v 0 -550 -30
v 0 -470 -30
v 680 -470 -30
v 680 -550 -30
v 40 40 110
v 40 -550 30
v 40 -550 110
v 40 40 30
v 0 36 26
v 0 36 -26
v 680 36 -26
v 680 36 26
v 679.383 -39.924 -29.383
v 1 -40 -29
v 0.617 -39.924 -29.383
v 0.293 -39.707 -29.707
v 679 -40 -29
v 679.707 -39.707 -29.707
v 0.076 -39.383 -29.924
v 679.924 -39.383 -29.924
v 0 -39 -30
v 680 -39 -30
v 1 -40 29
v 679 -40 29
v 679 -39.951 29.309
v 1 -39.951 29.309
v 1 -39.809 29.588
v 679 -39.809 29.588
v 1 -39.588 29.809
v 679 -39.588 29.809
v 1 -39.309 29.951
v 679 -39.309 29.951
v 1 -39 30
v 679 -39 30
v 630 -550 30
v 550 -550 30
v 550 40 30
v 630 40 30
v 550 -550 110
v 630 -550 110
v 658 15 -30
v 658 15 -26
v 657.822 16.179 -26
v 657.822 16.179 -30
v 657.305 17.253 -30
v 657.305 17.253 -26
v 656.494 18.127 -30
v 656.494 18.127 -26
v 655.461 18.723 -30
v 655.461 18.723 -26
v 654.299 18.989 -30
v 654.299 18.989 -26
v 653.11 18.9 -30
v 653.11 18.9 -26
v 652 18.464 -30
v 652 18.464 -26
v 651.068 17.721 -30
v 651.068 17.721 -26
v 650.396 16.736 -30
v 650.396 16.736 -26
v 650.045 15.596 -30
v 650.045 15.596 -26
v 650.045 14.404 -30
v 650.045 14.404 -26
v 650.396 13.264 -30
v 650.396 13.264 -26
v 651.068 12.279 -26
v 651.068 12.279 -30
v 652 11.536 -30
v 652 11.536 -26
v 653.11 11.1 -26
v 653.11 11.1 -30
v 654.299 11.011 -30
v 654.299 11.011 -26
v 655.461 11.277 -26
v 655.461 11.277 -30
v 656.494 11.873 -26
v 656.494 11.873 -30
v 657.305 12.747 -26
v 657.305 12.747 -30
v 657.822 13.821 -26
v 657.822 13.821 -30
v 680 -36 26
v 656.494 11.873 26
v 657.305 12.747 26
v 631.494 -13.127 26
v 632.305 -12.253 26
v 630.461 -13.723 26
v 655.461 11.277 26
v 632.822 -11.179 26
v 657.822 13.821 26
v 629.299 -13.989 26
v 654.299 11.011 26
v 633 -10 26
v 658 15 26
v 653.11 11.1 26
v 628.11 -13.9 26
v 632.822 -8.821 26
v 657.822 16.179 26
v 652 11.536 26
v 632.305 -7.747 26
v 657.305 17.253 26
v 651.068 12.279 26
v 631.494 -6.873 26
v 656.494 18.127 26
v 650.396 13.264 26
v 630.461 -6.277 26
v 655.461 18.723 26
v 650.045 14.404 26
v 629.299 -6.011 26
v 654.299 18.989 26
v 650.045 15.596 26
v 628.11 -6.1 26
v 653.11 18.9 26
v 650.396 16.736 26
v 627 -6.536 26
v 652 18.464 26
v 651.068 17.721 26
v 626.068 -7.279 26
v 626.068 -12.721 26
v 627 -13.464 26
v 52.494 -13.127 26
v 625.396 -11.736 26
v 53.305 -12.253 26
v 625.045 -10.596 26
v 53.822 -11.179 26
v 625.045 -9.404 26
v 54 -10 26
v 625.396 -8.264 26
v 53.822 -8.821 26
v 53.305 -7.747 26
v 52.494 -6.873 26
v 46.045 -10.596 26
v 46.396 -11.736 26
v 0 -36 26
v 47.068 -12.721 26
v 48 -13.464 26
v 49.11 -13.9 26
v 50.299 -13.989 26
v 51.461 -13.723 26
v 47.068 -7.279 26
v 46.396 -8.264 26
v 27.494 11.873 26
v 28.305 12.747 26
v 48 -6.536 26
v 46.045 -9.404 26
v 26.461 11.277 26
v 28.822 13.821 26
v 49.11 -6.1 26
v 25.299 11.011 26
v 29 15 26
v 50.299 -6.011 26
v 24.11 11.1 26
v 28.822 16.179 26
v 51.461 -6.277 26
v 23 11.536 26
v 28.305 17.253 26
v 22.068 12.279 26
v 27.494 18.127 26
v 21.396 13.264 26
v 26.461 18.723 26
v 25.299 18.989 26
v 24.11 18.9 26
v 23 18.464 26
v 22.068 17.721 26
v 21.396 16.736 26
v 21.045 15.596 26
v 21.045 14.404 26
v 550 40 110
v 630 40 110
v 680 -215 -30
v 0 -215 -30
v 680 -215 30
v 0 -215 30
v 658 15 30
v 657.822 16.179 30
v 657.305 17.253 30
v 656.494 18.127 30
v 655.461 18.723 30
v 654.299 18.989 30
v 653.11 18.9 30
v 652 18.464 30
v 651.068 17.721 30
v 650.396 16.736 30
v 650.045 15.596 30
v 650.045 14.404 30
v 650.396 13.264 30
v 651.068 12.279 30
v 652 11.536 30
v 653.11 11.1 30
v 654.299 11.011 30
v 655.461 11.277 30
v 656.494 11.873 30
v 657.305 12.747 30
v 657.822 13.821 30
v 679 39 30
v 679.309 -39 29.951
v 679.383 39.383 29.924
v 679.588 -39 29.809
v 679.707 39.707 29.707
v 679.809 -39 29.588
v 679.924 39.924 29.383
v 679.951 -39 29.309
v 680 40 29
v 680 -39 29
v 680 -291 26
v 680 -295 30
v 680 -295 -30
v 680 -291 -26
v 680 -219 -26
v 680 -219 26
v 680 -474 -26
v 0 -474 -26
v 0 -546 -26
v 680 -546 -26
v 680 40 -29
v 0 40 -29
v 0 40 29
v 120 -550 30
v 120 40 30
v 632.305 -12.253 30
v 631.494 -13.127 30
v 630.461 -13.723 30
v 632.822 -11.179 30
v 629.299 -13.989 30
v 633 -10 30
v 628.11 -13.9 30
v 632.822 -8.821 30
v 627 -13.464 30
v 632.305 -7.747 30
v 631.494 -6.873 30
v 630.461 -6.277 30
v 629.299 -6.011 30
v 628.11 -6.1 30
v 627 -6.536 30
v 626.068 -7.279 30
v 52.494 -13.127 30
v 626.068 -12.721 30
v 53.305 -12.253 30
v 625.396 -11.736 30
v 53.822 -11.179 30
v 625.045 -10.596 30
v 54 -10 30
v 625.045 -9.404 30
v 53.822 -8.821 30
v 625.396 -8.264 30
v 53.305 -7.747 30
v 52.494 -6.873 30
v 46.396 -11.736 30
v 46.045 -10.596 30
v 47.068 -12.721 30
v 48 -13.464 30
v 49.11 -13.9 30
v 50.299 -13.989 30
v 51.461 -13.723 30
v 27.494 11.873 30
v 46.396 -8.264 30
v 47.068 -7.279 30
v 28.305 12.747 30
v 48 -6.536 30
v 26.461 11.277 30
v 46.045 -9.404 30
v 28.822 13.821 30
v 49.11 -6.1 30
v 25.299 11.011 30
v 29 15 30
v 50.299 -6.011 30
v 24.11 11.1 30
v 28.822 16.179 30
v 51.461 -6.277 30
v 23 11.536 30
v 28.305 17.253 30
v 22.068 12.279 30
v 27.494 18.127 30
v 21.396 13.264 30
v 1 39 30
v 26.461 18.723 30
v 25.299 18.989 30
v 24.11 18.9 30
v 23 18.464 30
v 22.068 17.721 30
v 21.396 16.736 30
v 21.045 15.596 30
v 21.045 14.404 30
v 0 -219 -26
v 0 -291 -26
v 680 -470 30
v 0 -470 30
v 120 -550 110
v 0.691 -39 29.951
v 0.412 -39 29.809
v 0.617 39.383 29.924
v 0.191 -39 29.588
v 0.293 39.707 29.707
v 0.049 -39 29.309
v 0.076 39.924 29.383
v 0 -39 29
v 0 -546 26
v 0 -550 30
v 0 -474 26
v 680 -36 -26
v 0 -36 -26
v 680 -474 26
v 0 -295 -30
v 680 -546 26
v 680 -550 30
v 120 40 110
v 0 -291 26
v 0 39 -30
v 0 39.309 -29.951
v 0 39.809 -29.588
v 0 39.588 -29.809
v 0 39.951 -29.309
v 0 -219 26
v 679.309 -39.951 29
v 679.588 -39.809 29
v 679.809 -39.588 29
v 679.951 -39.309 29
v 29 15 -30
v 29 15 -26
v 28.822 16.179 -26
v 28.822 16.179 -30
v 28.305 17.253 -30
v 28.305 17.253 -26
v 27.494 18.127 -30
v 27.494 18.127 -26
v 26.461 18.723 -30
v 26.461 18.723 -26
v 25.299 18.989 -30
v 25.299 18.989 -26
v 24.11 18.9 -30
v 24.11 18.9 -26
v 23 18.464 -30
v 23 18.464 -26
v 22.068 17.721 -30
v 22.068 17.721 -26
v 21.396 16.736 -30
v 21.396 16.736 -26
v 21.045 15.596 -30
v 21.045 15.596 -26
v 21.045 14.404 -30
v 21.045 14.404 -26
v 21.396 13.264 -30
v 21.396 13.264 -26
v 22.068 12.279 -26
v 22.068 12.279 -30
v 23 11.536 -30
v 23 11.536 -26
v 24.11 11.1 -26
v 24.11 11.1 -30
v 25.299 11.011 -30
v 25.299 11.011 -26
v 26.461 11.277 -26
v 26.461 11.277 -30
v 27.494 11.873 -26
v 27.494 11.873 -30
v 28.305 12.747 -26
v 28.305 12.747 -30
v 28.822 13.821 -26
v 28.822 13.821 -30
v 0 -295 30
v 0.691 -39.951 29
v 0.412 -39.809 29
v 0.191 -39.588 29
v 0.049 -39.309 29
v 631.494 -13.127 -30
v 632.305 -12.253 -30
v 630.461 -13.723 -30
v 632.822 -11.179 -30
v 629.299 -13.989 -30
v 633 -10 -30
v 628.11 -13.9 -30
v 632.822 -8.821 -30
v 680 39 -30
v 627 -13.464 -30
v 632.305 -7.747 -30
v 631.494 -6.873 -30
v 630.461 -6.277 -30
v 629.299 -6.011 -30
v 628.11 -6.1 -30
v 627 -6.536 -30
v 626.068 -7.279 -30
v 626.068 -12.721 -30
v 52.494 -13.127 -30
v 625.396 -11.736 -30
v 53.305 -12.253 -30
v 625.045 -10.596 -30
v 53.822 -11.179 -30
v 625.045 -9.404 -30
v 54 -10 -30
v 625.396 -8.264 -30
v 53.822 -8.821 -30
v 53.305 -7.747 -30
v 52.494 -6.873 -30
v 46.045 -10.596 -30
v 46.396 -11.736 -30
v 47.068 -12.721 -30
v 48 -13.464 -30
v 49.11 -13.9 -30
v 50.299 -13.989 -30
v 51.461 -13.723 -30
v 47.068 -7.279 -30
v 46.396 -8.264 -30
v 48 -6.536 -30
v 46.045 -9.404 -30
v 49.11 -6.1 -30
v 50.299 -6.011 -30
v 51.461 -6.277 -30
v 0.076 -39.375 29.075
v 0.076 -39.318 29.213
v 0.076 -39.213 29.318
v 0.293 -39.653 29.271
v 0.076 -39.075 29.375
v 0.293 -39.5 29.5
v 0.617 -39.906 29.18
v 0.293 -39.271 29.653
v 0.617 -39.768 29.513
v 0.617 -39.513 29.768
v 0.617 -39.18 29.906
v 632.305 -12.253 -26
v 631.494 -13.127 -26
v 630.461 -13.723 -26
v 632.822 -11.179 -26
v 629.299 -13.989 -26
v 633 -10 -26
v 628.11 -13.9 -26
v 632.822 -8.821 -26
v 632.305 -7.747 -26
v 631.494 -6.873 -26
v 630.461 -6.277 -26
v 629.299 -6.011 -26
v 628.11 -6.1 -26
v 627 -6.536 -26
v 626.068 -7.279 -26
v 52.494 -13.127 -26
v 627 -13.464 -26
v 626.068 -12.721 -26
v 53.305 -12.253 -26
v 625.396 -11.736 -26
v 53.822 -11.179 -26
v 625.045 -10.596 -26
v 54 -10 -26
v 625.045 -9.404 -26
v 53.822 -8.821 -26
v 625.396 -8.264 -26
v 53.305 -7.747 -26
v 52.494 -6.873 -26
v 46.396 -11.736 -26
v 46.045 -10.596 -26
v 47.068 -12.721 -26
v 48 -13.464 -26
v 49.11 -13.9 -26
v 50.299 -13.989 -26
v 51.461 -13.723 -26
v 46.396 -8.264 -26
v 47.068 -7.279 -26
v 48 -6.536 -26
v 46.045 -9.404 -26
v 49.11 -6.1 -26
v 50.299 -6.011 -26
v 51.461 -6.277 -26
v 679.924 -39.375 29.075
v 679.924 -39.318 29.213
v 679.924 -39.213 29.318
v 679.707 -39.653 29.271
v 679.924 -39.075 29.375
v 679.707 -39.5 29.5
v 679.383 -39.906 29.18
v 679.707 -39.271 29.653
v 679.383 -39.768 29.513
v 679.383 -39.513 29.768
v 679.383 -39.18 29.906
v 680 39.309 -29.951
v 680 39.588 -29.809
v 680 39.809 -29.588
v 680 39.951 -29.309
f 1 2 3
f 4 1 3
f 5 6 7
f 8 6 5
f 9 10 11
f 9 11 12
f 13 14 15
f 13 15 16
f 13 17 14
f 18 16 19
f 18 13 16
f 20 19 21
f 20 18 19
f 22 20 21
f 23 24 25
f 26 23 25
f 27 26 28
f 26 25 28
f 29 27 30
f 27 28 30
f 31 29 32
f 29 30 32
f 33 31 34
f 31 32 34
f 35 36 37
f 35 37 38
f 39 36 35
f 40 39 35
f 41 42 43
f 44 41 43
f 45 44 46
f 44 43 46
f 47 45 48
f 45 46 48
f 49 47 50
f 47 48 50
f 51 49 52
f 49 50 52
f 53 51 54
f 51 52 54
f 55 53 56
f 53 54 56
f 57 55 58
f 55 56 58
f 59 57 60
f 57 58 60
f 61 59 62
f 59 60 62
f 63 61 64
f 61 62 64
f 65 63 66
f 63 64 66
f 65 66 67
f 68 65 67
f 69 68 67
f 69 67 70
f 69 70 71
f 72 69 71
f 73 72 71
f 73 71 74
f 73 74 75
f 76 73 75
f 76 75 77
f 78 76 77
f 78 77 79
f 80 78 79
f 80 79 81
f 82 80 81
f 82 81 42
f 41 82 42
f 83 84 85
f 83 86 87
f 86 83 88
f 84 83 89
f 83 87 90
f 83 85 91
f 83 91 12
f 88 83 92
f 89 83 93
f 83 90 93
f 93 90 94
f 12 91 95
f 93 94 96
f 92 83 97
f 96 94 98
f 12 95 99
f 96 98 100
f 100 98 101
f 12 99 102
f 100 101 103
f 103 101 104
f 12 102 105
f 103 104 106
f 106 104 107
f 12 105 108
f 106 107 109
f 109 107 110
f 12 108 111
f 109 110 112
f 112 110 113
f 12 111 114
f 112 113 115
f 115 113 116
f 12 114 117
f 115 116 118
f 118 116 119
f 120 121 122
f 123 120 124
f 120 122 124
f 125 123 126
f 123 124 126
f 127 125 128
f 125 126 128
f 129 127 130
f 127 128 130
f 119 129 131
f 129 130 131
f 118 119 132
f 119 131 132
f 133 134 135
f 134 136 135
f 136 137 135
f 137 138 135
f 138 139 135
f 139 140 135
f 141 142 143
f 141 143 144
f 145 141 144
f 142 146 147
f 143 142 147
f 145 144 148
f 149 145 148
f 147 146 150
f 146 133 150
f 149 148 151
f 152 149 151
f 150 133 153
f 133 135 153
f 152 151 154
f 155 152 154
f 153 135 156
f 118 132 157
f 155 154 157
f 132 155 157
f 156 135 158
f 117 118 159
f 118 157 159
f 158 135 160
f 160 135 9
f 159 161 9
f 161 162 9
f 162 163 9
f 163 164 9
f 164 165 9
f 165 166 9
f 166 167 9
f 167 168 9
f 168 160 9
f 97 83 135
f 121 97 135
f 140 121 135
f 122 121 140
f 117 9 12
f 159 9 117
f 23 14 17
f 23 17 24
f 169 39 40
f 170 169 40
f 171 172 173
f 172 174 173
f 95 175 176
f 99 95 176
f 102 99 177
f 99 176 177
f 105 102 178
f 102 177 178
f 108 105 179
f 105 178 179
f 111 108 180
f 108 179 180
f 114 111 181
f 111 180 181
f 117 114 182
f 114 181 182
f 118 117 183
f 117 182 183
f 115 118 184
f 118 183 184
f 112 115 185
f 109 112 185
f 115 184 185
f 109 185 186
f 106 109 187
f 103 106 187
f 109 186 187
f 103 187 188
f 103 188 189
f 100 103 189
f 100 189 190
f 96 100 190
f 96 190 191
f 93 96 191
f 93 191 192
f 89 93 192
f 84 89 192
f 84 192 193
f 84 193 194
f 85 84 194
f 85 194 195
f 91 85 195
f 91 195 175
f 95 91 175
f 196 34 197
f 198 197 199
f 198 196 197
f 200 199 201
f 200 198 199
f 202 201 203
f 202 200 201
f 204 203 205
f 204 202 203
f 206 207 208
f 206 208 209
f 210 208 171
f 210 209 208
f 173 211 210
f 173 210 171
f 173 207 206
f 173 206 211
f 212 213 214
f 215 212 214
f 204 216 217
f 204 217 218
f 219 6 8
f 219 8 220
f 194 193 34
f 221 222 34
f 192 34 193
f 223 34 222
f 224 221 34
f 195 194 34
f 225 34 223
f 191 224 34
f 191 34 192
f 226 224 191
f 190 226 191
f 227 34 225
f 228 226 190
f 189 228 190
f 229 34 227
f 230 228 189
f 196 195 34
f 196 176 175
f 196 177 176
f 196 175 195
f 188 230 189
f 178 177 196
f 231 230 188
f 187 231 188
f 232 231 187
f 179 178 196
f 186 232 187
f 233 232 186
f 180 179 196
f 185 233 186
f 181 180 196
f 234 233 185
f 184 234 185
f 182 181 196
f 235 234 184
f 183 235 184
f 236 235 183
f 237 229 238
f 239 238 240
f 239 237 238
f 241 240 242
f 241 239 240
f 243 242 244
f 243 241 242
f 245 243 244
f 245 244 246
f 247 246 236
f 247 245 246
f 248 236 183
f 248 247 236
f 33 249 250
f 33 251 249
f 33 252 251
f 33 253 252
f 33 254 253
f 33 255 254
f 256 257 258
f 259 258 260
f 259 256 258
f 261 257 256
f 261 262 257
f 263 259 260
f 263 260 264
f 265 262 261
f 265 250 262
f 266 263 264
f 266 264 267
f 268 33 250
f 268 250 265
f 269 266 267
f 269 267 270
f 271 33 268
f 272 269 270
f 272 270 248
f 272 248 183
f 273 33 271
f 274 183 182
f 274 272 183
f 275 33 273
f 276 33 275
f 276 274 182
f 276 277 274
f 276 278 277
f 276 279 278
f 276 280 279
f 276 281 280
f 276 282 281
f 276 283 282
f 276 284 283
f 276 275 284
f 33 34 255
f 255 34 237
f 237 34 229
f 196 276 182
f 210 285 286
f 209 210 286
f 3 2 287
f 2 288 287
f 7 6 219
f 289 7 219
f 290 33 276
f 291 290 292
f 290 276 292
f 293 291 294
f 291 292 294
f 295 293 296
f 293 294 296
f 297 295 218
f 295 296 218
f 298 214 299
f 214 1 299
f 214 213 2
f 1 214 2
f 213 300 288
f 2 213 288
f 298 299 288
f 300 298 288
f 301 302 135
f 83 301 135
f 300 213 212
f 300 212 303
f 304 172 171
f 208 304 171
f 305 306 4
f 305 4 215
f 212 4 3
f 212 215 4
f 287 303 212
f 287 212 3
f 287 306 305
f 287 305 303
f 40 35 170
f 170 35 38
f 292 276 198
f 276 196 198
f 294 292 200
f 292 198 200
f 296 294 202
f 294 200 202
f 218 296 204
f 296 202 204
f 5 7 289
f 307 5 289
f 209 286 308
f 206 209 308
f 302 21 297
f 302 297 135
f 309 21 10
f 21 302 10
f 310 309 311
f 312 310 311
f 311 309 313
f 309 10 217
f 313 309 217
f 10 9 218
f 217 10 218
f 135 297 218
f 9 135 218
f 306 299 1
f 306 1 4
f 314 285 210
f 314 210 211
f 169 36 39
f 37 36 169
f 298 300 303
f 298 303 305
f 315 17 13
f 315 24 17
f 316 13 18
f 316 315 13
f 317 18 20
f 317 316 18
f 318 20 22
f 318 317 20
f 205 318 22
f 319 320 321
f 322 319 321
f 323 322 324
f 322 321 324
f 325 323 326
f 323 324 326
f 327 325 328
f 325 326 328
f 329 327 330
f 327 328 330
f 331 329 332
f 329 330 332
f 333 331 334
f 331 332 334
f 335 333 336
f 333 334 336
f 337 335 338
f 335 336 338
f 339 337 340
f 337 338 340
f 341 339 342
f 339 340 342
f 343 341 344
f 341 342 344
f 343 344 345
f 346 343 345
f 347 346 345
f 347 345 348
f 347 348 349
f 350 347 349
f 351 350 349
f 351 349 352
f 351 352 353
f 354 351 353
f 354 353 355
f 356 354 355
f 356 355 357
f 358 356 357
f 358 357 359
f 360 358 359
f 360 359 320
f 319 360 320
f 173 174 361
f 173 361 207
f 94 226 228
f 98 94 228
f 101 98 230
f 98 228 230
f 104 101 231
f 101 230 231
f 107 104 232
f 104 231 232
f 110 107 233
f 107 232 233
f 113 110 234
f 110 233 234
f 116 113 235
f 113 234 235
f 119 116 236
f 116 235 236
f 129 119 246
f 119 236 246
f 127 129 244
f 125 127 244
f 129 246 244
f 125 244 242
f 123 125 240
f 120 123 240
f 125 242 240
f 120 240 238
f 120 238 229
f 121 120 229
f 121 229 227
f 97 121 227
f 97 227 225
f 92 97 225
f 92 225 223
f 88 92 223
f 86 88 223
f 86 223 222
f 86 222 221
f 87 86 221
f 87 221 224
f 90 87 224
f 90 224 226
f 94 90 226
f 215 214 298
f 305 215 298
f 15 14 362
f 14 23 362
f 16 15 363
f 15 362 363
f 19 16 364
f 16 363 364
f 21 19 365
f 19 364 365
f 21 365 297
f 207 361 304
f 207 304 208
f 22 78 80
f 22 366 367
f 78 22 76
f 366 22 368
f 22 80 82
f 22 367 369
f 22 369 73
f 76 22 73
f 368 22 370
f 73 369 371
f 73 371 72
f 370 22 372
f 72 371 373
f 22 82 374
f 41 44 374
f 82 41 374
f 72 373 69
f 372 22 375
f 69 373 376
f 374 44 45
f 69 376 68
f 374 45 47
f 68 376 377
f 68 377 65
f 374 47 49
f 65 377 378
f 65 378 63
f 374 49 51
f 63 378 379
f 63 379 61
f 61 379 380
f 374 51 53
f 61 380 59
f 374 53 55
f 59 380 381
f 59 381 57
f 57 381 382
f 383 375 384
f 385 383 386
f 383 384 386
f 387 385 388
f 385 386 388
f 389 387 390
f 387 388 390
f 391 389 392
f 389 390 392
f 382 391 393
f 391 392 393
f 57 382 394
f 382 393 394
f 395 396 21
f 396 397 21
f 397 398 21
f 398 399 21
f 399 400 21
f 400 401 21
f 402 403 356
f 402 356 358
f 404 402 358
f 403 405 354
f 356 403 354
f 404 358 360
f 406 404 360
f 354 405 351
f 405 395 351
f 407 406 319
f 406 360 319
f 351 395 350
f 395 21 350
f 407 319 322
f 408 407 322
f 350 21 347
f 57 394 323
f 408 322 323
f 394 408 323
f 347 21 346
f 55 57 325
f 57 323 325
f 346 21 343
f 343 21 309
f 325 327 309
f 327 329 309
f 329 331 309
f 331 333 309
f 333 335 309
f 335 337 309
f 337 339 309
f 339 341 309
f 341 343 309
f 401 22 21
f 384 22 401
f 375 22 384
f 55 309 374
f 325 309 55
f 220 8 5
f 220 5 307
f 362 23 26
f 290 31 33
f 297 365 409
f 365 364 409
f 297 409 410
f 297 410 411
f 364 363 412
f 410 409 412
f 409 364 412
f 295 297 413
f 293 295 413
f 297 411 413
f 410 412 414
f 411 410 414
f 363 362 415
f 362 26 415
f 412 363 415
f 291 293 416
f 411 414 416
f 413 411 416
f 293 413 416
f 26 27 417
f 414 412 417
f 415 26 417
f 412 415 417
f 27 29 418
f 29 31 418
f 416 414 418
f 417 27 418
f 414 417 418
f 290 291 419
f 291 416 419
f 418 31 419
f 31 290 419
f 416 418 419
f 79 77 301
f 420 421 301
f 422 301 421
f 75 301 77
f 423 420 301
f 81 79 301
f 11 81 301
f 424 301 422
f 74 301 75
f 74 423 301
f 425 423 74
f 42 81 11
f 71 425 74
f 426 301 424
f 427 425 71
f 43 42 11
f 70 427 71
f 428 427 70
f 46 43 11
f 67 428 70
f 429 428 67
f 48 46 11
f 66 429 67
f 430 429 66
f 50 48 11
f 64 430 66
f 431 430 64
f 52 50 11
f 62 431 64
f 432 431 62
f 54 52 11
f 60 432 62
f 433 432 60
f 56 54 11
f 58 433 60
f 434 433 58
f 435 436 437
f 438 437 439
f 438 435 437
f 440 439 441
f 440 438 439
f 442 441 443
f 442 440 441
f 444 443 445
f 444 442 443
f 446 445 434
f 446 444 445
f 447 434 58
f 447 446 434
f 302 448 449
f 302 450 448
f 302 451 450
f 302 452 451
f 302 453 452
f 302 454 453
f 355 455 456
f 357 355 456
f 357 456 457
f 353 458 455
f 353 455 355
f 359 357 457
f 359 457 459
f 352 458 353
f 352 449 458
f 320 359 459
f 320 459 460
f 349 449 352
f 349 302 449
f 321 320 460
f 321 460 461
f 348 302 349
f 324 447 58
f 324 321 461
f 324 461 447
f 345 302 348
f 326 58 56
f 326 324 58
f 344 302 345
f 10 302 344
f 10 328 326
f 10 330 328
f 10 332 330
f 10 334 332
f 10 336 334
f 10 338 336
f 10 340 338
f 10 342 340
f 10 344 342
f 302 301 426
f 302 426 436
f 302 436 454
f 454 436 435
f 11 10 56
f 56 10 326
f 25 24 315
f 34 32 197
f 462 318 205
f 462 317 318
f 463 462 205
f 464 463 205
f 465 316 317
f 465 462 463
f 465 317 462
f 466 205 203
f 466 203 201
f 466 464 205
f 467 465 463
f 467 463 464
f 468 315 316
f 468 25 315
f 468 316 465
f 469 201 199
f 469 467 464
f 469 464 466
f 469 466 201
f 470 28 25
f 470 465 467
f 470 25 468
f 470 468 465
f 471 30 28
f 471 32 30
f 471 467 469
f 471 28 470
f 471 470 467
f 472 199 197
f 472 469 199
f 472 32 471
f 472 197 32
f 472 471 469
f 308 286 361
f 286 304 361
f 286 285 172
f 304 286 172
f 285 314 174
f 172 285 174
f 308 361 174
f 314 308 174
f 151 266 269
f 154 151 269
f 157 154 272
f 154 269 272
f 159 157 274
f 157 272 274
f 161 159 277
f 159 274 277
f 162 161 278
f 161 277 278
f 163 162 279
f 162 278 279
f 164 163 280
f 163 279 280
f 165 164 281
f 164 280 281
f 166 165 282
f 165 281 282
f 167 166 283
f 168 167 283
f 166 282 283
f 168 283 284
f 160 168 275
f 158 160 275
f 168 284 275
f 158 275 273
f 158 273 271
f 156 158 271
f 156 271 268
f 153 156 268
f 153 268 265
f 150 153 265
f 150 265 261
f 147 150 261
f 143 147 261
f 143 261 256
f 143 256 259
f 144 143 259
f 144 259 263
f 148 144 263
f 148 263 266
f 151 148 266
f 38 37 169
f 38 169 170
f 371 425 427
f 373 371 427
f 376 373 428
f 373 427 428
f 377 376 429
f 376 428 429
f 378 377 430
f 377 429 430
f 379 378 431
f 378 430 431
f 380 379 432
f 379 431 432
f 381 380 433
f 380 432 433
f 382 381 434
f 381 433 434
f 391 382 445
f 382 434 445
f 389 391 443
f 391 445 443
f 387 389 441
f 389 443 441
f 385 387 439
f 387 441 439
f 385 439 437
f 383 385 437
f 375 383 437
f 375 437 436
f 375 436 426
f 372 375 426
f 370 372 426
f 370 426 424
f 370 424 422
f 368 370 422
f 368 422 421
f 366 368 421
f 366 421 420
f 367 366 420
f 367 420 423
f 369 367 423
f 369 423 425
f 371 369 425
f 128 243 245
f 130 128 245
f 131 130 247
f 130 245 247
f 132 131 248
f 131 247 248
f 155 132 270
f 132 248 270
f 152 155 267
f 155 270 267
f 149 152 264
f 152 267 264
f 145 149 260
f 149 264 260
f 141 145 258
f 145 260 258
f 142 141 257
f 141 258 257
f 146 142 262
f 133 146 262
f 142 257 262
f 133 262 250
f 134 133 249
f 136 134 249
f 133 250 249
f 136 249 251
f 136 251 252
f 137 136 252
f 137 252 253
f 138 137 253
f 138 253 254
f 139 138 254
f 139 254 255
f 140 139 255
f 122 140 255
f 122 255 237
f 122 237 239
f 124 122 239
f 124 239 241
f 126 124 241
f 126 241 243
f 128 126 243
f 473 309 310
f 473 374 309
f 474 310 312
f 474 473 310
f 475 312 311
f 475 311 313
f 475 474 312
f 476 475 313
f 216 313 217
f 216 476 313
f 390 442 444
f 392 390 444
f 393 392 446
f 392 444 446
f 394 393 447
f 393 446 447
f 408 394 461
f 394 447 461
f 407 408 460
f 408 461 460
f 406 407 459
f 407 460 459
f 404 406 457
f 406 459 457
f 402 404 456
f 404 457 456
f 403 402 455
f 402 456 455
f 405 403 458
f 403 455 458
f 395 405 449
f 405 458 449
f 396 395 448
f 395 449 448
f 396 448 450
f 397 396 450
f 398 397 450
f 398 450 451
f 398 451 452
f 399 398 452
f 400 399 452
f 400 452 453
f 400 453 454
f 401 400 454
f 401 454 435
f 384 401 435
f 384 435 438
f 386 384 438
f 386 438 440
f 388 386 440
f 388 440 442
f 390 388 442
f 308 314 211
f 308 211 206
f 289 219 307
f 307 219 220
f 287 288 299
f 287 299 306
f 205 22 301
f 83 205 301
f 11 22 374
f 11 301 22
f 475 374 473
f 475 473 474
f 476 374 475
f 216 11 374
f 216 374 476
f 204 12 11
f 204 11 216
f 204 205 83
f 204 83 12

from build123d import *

# Parameters (mm, degrees)
F0_W      = 80
F0_H      = 60
F2_DEPTH  = 680
F1_W      = 72
F1_H      = 52
F3_DEPTH  = 680.001
F4_R      = 1
F5_R      = 4
F6_DEPTH  = 254
F7_W      = 680
F7_H      = 80
F8_DEPTH  = 30
F9_W      = 72
F9_H      = 52
F10_DEPTH = 680.001
F11_W     = 680
F11_H     = 80
F12_DEPTH = 30
F13_W     = 72
F13_H     = 52
F14_DEPTH = 680.001
F15_W     = 80
F15_H     = 590
F16_DEPTH = 80


with BuildPart() as f2:
    # F0 (on Right) → F2 (new body)
    with BuildSketch(Plane.YZ):
        Rectangle(F0_W, F0_H)
    extrude(amount=F2_DEPTH)

    # F1 (on Right) → F3 (cut, through all)
    with BuildSketch(Plane.YZ):
        Rectangle(F1_W, F1_H)
    extrude(amount=F3_DEPTH, mode=Mode.SUBTRACT)

    # F4
    f4_edges = [f2.edges().sort_by_distance(p)[0] for p in [
        (340, -40, 30),
        (340, -40, -30),
        (0, -40, 0),
        (680, -40, 0),
        (340, 40, 30),
        (0, 0, 30),
        (680, 0, 30),
        (340, 40, -30),
    ]]
    fillet(f4_edges, radius=F4_R)

    # F5 (on face) → F6 (cut)
    with BuildSketch(Plane.XY.offset(30)):
        with Locations((25, 15)):
            Circle(F5_R)
        with Locations((50, -10)):
            Circle(F5_R)
        with Locations((654, 15)):
            Circle(F5_R)
        with Locations((629, -10)):
            Circle(F5_R)
    extrude(amount=-F6_DEPTH, mode=Mode.SUBTRACT)


with BuildPart() as f8:
    # F7 (on Top) → F8 (new body, symmetric)
    with BuildSketch(Plane.XY):
        with Locations((340, -510)):
            Rectangle(F7_W, F7_H)
    extrude(amount=F8_DEPTH, both=True)

    # F9 (on face) → F10 (cut, through all)
    with BuildSketch(Plane(origin=(0, 0, 0), x_dir=(0, -1, 0), z_dir=(-1, 0, 0))):
        with Locations((510, 0)):
            Rectangle(F9_W, F9_H)
    extrude(amount=-F10_DEPTH, mode=Mode.SUBTRACT)


with BuildPart() as f12:
    # F11 (on Top) → F12 (new body, symmetric)
    with BuildSketch(Plane.XY):
        with Locations((340, -255)):
            Rectangle(F11_W, F11_H)
    extrude(amount=F12_DEPTH, both=True)

    # F13 (on face) → F14 (cut, through all)
    with BuildSketch(Plane(origin=(0, 0, 0), x_dir=(0, -1, 0), z_dir=(-1, 0, 0))):
        with Locations((255, 0)):
            Rectangle(F13_W, F13_H)
    extrude(amount=-F14_DEPTH, mode=Mode.SUBTRACT)


with BuildPart() as f16:
    # F15 (on face) → F16 (new body)
    with BuildSketch(Plane.XY.offset(30)):
        with Locations((80, -255)):
            Rectangle(F15_W, F15_H)
        with Locations((590, -255)):
            Rectangle(F15_W, F15_H)
    extrude(amount=F16_DEPTH)


solid = Compound([f2.part, f8.part, f12.part, f16.part])
